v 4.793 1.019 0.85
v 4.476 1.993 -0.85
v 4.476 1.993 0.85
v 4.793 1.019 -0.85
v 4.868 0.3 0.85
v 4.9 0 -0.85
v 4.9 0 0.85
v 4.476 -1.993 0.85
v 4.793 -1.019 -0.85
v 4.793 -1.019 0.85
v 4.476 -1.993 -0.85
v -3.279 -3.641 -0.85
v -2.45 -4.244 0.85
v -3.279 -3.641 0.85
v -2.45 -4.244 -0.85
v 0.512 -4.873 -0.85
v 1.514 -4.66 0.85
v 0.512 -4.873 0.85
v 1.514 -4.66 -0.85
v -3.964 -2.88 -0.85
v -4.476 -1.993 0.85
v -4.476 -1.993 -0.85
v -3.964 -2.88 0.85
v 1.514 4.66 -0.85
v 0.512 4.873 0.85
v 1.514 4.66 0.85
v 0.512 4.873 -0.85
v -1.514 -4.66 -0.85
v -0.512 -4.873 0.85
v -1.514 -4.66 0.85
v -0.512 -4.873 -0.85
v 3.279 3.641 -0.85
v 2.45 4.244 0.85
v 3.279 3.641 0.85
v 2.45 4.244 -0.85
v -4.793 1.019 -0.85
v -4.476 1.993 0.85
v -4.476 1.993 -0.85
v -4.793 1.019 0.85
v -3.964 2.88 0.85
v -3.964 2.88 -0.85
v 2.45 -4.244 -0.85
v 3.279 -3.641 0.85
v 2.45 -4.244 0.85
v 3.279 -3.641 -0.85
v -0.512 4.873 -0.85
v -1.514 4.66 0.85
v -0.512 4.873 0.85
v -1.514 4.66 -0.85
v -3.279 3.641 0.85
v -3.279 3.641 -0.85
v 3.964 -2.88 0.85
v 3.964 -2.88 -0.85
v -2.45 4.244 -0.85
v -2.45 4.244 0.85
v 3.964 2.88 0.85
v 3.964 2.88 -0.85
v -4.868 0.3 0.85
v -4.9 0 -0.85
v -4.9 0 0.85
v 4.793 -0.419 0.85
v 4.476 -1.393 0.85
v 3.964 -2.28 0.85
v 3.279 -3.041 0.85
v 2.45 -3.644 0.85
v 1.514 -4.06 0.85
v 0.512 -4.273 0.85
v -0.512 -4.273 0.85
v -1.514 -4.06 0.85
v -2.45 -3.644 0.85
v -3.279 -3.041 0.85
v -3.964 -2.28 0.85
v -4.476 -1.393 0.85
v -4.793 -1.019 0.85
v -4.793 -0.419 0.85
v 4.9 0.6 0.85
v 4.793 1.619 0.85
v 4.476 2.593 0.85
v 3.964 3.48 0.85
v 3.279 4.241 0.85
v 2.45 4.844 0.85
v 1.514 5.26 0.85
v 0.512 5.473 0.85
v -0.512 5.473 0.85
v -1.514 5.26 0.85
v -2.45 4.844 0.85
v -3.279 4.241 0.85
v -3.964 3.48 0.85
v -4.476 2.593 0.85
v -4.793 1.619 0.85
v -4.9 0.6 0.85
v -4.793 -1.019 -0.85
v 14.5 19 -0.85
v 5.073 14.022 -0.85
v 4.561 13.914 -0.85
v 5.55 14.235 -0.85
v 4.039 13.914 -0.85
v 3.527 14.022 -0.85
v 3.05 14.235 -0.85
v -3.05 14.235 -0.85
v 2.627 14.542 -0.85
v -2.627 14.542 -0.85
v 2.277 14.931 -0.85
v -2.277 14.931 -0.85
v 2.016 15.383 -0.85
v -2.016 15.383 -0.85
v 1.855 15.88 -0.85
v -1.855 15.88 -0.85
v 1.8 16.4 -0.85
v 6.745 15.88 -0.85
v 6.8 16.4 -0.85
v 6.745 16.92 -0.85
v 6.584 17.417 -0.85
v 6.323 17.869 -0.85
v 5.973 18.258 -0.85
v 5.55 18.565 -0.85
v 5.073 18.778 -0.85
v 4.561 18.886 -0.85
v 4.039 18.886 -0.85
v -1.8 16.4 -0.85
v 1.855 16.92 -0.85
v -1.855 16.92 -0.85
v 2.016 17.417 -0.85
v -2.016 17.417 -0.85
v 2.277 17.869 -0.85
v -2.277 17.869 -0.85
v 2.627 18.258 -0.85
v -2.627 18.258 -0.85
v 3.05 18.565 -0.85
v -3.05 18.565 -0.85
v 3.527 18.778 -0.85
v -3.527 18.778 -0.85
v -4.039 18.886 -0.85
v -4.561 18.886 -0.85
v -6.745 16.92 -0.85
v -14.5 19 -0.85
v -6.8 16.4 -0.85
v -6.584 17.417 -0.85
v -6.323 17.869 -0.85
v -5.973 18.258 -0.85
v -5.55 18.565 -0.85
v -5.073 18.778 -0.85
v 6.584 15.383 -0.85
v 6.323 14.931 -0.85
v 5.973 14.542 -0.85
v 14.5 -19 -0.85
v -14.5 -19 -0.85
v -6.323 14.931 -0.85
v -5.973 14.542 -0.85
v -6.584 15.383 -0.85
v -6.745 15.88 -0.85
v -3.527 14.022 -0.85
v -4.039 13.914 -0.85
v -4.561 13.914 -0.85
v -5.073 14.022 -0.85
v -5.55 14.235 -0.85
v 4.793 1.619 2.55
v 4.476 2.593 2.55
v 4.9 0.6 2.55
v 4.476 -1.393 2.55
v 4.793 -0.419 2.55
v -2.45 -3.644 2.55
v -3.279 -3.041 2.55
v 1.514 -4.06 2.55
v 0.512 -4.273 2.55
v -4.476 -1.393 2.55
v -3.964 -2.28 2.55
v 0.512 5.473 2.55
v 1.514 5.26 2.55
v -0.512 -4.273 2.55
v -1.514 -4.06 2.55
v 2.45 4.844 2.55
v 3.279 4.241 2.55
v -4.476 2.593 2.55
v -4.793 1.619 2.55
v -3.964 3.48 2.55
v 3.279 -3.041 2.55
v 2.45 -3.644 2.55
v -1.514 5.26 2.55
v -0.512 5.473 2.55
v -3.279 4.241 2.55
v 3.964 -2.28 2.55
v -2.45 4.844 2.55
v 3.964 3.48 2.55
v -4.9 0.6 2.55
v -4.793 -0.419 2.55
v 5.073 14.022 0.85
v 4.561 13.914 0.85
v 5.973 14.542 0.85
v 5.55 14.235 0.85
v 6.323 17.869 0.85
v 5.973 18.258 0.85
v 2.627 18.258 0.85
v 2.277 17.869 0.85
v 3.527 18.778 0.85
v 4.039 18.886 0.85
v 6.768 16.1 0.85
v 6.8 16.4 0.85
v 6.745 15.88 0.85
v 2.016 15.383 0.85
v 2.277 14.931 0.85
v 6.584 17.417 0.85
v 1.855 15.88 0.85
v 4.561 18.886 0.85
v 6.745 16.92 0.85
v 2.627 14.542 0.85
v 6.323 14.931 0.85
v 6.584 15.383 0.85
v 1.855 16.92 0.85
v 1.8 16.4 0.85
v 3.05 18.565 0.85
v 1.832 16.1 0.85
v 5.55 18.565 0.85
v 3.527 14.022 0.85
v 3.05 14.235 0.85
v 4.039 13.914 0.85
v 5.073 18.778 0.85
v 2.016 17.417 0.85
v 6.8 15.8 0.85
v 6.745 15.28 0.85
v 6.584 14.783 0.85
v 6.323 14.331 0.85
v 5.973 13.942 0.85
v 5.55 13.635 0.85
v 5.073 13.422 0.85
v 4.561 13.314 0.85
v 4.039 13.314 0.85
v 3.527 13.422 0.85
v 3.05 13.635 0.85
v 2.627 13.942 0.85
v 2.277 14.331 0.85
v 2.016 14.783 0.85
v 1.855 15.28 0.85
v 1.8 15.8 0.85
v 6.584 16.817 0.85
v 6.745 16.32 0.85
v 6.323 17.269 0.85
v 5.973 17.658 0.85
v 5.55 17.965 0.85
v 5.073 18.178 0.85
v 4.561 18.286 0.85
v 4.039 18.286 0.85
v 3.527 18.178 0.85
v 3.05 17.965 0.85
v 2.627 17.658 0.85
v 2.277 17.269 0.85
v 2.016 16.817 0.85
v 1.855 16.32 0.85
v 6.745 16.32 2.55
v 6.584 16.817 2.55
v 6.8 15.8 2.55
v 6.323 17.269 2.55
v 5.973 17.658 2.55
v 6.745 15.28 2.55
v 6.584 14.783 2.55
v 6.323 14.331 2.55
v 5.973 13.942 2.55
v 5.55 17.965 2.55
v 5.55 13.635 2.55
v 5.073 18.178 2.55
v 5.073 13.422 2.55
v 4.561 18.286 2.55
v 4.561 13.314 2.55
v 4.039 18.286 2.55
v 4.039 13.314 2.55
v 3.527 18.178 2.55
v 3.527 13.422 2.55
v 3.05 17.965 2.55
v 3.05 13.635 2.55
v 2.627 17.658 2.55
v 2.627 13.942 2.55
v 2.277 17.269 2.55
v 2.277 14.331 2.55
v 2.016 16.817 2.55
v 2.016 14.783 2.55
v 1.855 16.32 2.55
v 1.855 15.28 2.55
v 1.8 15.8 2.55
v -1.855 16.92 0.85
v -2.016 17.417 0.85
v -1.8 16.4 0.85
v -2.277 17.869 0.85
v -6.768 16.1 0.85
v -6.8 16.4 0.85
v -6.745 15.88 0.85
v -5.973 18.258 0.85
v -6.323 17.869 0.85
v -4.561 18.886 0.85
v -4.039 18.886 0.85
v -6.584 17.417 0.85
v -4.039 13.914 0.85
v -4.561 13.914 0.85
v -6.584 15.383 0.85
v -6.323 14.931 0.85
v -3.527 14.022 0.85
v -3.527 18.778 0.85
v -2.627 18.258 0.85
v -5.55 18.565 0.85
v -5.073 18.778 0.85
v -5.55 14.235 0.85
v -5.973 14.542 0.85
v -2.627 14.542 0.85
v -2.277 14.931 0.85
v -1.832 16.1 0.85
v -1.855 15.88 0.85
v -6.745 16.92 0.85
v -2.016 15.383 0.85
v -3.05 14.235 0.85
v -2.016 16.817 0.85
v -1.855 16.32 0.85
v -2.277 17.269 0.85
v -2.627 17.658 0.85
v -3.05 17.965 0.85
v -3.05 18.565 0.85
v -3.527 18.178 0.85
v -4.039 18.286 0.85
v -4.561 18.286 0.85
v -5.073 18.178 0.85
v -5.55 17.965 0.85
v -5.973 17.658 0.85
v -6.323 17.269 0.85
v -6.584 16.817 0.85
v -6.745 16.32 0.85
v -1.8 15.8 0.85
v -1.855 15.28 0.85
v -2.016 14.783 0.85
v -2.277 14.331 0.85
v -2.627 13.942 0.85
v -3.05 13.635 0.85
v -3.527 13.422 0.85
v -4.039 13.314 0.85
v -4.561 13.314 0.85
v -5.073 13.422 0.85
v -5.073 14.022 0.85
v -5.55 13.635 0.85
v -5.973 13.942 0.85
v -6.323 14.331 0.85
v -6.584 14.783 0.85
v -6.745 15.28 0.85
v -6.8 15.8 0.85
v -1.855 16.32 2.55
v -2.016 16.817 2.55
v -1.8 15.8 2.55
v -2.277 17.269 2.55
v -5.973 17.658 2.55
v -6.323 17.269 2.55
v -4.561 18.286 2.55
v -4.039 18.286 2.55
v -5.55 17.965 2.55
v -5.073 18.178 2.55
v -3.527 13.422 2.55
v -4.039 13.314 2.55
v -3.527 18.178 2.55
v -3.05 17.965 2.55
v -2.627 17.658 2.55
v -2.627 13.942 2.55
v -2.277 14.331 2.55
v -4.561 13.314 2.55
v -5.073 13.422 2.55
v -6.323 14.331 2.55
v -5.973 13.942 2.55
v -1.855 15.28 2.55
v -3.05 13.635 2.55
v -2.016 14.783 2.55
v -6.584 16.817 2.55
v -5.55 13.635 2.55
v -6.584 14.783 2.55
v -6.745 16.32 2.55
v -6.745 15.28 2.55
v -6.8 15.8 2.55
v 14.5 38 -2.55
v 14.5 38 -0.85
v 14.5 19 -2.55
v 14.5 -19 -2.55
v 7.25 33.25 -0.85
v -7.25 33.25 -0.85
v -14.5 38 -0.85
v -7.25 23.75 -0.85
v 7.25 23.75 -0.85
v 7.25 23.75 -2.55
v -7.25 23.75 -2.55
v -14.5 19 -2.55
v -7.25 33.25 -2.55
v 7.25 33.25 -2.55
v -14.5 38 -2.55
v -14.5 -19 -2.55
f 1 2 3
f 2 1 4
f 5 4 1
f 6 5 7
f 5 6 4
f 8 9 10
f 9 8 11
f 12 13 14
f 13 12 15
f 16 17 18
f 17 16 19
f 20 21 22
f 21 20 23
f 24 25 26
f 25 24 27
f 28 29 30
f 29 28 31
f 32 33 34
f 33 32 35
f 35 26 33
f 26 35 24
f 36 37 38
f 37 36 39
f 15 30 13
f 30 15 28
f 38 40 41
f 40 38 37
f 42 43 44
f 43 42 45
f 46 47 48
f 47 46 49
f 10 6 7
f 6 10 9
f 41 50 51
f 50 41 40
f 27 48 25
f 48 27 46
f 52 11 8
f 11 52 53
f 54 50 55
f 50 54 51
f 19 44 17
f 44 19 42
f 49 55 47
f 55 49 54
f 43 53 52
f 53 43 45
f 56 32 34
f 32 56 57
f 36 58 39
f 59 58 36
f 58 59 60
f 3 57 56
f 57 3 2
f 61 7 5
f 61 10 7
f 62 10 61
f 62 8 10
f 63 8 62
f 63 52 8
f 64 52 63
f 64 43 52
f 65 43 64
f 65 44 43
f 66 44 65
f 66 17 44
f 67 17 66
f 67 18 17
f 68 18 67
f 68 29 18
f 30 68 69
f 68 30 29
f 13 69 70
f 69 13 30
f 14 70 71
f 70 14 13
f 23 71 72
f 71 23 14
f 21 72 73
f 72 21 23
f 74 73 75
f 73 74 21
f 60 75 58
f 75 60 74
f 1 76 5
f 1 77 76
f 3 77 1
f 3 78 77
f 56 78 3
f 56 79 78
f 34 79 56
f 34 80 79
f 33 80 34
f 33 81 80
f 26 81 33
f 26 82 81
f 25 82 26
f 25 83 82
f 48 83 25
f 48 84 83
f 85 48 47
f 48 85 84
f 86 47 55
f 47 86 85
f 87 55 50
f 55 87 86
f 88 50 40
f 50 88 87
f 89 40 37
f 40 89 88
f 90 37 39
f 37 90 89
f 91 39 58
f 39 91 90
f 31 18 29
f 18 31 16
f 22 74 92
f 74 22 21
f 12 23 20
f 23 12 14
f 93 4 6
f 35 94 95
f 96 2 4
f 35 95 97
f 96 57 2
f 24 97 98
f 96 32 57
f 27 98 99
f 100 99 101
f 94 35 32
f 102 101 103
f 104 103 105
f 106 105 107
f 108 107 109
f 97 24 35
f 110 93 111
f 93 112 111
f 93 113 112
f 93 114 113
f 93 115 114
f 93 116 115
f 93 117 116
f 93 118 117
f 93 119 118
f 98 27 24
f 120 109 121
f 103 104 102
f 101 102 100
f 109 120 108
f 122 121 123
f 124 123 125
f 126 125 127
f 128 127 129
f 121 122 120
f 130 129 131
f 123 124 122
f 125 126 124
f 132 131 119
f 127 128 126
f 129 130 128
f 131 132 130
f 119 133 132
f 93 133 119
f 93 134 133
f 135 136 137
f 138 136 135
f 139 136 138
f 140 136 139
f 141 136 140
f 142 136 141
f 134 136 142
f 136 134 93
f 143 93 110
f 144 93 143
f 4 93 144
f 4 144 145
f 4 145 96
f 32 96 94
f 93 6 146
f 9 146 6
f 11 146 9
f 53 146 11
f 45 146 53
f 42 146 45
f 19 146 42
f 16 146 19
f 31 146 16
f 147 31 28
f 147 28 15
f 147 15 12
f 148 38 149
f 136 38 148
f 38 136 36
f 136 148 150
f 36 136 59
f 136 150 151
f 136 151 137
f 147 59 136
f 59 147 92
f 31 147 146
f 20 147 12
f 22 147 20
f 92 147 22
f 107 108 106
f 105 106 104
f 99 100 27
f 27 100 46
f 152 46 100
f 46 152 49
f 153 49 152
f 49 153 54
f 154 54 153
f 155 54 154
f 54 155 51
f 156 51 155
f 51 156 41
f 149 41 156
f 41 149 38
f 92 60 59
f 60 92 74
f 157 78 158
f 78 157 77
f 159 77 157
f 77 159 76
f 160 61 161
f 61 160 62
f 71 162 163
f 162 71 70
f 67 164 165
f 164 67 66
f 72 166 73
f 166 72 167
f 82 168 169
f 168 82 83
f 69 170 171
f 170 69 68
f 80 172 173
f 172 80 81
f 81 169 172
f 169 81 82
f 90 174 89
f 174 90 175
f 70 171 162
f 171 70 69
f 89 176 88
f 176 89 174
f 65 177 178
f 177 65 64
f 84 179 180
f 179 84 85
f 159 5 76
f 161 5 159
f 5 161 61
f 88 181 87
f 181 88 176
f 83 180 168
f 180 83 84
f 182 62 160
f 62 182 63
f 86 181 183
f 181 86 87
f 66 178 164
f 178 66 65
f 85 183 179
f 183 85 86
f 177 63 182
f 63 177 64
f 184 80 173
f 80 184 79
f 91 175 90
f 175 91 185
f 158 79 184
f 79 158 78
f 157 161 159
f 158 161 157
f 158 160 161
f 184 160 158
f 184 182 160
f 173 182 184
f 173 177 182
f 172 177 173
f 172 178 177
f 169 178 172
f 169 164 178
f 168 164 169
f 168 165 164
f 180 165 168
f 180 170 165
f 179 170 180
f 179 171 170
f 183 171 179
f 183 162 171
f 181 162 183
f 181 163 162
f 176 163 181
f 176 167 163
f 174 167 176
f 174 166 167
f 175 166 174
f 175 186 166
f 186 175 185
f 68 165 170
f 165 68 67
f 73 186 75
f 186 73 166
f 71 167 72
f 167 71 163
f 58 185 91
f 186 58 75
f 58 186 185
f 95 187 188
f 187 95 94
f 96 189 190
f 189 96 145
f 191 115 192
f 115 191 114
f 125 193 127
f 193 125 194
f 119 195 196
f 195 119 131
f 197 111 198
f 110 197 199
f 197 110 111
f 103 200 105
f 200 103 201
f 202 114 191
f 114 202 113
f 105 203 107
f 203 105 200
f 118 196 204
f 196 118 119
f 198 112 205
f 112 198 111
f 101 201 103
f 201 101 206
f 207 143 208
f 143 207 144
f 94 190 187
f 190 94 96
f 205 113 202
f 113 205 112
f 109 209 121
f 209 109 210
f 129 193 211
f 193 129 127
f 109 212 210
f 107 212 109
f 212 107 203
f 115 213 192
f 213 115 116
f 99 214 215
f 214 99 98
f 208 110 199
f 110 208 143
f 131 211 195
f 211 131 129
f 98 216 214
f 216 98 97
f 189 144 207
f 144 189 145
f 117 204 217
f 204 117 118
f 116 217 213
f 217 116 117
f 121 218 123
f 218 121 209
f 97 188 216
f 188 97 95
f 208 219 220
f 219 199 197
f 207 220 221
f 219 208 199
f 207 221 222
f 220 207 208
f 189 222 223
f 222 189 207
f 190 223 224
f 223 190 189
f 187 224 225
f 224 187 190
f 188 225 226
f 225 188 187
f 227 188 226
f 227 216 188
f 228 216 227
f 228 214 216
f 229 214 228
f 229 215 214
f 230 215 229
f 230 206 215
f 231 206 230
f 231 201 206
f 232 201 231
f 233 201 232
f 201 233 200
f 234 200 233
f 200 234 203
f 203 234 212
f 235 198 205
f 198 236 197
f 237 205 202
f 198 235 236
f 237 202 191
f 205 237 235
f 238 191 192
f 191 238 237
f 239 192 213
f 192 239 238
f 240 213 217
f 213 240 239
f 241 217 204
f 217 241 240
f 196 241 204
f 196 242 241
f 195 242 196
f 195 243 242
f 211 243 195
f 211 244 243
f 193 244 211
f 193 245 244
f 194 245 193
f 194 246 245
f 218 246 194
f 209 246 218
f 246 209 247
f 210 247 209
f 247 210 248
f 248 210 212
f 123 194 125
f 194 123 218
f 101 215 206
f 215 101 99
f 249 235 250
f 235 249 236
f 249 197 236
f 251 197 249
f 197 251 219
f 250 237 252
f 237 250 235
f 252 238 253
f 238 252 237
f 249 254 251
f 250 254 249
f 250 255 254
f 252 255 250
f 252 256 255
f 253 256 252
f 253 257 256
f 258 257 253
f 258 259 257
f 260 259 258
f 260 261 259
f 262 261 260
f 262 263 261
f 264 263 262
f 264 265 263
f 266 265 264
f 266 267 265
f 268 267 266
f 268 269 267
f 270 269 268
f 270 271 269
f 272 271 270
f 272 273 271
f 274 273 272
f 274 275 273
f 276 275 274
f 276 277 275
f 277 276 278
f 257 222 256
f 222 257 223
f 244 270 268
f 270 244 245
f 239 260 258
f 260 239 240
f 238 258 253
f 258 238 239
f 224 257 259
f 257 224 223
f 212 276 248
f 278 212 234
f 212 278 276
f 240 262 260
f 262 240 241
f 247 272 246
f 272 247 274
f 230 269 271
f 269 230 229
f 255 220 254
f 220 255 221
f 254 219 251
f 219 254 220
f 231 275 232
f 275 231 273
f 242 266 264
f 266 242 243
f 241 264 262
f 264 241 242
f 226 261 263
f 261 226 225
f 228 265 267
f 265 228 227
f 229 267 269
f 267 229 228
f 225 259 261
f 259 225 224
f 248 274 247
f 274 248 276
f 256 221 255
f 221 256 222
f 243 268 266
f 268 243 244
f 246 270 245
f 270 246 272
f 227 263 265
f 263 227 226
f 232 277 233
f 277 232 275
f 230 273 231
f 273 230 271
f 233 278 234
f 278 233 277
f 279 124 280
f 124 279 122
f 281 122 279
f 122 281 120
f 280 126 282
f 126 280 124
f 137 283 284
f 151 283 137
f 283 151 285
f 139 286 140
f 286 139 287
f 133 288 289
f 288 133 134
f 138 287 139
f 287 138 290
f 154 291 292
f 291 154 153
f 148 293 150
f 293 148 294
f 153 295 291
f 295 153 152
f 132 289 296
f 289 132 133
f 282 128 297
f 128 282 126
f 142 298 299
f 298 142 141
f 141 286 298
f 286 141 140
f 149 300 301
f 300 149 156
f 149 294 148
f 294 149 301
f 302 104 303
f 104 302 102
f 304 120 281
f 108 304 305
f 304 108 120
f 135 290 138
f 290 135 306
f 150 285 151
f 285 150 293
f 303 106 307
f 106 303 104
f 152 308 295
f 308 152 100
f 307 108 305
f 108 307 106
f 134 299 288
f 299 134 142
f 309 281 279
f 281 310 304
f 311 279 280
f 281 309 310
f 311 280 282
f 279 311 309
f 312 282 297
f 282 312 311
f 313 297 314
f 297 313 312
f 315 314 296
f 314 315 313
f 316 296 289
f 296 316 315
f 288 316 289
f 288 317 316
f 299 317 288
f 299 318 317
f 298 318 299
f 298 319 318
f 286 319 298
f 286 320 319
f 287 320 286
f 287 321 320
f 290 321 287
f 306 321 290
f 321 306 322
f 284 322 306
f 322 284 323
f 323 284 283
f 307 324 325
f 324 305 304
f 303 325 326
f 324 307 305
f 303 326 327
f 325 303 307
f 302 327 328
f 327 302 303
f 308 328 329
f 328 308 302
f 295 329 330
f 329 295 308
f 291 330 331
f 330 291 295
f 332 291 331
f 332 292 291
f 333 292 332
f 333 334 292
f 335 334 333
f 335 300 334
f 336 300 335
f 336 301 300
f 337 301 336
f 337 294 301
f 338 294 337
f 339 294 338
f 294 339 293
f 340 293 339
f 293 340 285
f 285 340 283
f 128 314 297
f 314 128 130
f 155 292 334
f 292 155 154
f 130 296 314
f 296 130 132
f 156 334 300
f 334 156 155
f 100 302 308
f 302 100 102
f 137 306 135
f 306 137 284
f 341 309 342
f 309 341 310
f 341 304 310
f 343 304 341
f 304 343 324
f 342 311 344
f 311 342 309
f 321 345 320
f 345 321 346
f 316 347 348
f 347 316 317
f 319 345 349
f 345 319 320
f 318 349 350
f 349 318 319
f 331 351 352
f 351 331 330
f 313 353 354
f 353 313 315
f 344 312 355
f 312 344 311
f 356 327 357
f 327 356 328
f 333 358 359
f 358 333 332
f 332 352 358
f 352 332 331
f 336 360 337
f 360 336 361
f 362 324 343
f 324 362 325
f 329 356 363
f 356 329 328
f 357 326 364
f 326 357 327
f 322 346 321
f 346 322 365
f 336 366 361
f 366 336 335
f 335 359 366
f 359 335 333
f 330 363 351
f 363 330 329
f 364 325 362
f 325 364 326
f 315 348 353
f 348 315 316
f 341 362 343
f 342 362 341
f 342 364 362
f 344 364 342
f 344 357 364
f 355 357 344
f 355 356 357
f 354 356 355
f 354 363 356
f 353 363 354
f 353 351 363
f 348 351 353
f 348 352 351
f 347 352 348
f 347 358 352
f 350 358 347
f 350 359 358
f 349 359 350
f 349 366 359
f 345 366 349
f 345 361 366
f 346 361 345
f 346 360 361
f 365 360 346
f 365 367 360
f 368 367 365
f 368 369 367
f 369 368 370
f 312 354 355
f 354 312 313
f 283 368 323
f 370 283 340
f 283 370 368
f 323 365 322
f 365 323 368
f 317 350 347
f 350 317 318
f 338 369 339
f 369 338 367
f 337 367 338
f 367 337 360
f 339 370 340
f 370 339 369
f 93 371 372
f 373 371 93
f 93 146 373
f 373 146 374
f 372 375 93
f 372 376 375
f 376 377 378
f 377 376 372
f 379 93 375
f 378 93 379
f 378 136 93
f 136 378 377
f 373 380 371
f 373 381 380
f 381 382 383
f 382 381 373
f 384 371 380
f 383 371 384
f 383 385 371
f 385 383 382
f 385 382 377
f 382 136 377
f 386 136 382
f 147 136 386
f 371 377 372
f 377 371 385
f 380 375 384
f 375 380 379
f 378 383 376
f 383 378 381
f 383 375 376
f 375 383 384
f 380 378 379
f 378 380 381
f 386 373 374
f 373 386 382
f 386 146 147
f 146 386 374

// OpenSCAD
w = 29;
h = 38;

t = 1.7;
ld = 9.8;
sd = 5.0;

x = 8.6/2;
y = 16.4;

module clip (d, x, y, lean) {
    dy = 0.6 * lean;
    translate([x,y,0])
        cylinder(h=t, d=d, $fn=30, center=true);
    translate([x,y+dy,t])
        cylinder(h=t, d=d, $fn=30, center=true);    
}

clip(ld, 0, 0, 1);
clip(sd, x, y, -1);
clip(sd, -x, y, -1);
translate([0,0,-t])
    cube([w,h,t], true);

oh = 19;
ih = oh/2;

translate([0,(h+oh)/2,-t]) {
    difference() {
        cube([w,oh,t],true);
        cube([w/2,ih,1.1*t],true);
    }
}
